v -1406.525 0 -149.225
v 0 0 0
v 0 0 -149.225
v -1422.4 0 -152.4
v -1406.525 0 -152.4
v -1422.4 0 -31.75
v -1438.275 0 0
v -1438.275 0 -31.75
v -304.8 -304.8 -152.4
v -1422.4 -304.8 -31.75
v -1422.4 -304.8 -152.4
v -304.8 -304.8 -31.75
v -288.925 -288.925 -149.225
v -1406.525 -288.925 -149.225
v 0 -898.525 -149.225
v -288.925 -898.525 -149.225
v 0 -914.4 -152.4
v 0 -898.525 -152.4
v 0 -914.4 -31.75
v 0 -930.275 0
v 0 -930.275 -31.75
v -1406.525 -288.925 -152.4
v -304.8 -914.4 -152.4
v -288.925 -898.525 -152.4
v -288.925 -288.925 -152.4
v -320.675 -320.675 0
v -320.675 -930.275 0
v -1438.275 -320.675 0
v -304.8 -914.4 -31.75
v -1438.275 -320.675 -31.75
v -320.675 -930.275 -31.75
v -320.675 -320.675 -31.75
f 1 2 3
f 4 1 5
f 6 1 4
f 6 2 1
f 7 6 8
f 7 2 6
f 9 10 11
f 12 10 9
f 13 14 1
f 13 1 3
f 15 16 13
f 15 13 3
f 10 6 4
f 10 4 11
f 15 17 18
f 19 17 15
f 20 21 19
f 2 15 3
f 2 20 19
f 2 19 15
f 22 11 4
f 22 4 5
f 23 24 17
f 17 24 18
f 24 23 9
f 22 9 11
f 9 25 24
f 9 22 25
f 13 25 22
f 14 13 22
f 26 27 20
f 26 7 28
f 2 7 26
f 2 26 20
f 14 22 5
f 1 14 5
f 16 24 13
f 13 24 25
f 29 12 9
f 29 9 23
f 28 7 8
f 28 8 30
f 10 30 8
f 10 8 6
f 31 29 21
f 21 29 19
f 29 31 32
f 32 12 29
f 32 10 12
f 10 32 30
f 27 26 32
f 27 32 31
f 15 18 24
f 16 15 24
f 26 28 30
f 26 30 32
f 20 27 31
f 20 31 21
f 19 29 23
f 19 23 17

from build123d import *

# Parameters (mm, degrees)
F4_DEPTH = 152.4
F1_DEPTH = 31.75
F3_DEPTH = 3.175


with BuildPart() as f4:
    # F0 (on Top) → F4 (new body)
    with BuildSketch(Plane.XY):
        Polygon((0, 0), (-1422.4, 0), (-1422.4, -304.8), (-304.8, -304.8), (-304.8, -914.4), (0, -914.4), align=None)
    extrude(amount=-F4_DEPTH)

    # F5 (on face) → F1 (join)
    with BuildSketch(Plane.XY):
        Polygon((0, -930.275), (0, 0), (-1438.275, 0), (-1438.275, -320.675), (-320.675, -320.675), (-320.675, -930.275), align=None)
    extrude(amount=-F1_DEPTH)

    # F2 (on face) → F3 (cut)
    with BuildSketch(Plane(origin=(0, 0, -152.4), x_dir=(1, 0, 0), z_dir=(0, 0, -1))):
        Polygon((-288.925, 288.925), (-1406.525, 288.925), (-1406.525, 15.875), (-1406.525, 0), (0, 0), (0, 898.525), (-15.875, 898.525), (-288.925, 898.525), align=None)
    extrude(amount=-F3_DEPTH, mode=Mode.SUBTRACT)


solid = f4.part
